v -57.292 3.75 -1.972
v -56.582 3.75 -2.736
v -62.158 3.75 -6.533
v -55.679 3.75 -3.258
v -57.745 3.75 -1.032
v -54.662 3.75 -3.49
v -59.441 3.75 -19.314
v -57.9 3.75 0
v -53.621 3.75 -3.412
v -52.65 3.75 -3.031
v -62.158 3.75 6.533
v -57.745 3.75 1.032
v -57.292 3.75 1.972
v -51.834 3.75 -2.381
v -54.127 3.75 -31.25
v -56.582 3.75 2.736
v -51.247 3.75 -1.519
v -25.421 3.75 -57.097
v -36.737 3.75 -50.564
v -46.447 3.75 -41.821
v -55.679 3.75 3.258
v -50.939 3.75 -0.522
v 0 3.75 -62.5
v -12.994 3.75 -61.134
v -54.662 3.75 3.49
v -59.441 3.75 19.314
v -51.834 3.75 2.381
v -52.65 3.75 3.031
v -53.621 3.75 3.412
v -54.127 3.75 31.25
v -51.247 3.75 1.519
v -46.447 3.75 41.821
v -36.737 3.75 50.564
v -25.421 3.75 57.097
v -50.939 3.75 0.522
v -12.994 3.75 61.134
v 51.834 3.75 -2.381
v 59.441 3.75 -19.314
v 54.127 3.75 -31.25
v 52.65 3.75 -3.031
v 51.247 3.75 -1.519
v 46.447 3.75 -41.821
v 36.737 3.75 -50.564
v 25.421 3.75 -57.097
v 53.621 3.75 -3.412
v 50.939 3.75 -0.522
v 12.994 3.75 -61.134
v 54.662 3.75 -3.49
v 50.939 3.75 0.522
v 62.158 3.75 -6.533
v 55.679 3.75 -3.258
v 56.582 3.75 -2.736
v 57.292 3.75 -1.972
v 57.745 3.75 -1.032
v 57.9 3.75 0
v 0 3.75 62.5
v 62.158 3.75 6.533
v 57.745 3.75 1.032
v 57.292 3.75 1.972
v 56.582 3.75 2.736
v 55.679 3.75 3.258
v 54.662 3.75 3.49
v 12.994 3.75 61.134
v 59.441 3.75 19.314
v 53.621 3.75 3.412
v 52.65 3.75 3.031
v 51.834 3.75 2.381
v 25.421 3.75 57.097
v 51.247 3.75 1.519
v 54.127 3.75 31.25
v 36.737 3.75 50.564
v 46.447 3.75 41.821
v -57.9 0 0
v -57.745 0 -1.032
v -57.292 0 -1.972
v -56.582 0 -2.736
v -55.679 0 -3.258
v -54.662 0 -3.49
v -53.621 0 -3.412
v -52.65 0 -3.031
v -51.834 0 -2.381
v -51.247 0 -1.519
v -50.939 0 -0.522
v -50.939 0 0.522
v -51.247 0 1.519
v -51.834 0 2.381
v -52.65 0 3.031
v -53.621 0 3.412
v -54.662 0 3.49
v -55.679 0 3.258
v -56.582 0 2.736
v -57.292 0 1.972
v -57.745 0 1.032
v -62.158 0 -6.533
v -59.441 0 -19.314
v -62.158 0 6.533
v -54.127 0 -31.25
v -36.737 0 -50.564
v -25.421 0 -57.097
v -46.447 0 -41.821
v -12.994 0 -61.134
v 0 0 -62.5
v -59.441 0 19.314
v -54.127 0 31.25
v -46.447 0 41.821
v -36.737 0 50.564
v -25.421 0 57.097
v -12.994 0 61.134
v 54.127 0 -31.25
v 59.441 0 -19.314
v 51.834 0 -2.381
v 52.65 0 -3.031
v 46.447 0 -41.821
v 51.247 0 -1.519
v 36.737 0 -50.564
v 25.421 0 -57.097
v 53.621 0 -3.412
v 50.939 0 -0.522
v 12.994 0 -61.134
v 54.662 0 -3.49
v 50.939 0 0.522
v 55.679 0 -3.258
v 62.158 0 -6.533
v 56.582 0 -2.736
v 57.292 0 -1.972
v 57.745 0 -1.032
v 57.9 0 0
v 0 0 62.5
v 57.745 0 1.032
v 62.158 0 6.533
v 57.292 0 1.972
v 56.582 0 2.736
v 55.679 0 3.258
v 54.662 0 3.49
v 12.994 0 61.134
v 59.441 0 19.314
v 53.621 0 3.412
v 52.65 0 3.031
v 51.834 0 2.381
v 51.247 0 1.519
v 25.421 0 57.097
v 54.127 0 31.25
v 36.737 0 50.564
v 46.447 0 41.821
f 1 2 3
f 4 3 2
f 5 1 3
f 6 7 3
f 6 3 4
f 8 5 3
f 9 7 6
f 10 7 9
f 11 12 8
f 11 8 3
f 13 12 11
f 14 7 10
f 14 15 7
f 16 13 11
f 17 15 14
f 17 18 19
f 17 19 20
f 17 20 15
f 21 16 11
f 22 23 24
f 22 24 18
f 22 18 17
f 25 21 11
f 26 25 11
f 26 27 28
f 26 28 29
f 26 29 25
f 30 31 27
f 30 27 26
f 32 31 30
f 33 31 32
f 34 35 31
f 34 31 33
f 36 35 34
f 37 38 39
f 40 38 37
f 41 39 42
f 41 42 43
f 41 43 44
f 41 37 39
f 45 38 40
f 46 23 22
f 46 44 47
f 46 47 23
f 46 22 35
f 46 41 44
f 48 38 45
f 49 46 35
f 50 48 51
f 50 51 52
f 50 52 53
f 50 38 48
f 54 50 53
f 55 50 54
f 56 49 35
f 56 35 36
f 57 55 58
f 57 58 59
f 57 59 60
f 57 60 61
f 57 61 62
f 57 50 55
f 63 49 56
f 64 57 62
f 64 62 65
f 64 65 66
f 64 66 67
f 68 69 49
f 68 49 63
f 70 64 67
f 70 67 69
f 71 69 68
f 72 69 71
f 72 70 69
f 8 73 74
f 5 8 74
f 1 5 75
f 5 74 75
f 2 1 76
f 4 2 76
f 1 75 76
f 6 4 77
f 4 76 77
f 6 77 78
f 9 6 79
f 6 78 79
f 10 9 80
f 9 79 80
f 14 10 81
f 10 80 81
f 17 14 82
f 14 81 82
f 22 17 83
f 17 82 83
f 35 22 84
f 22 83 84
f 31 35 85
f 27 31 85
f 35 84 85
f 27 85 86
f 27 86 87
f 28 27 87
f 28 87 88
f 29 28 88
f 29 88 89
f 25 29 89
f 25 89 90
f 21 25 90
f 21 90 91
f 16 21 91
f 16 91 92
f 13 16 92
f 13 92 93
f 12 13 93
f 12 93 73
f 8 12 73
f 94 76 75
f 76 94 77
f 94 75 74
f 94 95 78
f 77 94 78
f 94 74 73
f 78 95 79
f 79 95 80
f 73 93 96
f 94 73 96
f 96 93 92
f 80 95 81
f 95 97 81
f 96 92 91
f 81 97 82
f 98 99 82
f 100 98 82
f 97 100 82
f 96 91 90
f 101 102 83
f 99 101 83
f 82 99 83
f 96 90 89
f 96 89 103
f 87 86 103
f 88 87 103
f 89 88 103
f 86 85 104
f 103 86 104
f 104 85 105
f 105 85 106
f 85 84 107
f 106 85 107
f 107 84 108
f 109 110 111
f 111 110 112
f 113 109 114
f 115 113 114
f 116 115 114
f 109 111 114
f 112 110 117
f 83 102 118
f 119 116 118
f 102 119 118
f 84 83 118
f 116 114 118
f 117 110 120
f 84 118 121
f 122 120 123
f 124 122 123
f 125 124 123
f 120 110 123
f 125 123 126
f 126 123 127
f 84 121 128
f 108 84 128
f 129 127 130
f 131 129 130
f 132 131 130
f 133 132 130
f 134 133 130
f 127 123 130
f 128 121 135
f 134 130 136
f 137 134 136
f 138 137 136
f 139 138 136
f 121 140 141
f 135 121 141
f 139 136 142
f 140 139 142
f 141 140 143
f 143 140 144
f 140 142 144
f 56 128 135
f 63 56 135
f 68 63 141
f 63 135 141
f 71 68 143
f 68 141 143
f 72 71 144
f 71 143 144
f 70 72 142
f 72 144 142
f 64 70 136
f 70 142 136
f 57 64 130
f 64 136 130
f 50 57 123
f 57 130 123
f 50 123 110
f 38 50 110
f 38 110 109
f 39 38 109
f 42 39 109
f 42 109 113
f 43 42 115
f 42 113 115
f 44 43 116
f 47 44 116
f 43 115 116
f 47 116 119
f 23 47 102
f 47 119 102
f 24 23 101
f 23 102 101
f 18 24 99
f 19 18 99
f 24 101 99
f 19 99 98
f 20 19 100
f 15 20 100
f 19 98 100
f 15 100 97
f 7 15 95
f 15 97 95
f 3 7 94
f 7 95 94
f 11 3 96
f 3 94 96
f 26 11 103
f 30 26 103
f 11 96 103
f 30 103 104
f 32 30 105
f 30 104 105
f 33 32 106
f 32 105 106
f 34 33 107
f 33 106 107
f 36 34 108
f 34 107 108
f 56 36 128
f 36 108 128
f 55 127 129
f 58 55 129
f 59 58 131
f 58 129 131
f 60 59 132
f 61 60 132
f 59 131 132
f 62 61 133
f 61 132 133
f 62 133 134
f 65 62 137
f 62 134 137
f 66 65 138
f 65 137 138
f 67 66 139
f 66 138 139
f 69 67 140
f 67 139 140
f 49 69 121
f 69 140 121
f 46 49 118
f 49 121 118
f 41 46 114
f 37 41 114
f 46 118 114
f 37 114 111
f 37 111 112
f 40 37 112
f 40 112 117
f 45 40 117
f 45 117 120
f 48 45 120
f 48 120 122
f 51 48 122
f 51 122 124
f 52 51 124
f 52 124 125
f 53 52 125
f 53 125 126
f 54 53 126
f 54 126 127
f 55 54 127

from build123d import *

# Parameters (mm, degrees)
SKETCH1_R            = 62.5
BOSS_EXTRUDE1_DEPTH  = 3.75
M6_CLEARANCE_HOLE1_D = 7
CIRPATTERN1_COUNT    = 2


with BuildPart() as part:
    # Sketch1 → Boss-Extrude1 (new body)
    with BuildSketch(Plane(origin=(0, 0, 0), x_dir=(1, 0, 0), z_dir=(0, 1, 0))):
        with Locations(Location((0, 0, 0), (0, 0, 270))):
            Circle(SKETCH1_R)
    extrude(amount=BOSS_EXTRUDE1_DEPTH)

    # M6 Clearance Hole1 (through all)
    with Locations(Plane(origin=(0, 3.75, 0), x_dir=(1, 0, 0), z_dir=(0, 1, 0))):
        with Locations((-54.4, 0)):
            m6_clearance_hole1 = Hole(M6_CLEARANCE_HOLE1_D / 2)

    # CirPattern1: M6 Clearance Hole1 ×2 about axis
    cirpattern1_axis = Axis((0, 0, 0), (0, 1, 0))
    for i in range(1, CIRPATTERN1_COUNT):
        add(m6_clearance_hole1.rotate(cirpattern1_axis, i * 360 / CIRPATTERN1_COUNT), mode=Mode.SUBTRACT)


solid = part.part
